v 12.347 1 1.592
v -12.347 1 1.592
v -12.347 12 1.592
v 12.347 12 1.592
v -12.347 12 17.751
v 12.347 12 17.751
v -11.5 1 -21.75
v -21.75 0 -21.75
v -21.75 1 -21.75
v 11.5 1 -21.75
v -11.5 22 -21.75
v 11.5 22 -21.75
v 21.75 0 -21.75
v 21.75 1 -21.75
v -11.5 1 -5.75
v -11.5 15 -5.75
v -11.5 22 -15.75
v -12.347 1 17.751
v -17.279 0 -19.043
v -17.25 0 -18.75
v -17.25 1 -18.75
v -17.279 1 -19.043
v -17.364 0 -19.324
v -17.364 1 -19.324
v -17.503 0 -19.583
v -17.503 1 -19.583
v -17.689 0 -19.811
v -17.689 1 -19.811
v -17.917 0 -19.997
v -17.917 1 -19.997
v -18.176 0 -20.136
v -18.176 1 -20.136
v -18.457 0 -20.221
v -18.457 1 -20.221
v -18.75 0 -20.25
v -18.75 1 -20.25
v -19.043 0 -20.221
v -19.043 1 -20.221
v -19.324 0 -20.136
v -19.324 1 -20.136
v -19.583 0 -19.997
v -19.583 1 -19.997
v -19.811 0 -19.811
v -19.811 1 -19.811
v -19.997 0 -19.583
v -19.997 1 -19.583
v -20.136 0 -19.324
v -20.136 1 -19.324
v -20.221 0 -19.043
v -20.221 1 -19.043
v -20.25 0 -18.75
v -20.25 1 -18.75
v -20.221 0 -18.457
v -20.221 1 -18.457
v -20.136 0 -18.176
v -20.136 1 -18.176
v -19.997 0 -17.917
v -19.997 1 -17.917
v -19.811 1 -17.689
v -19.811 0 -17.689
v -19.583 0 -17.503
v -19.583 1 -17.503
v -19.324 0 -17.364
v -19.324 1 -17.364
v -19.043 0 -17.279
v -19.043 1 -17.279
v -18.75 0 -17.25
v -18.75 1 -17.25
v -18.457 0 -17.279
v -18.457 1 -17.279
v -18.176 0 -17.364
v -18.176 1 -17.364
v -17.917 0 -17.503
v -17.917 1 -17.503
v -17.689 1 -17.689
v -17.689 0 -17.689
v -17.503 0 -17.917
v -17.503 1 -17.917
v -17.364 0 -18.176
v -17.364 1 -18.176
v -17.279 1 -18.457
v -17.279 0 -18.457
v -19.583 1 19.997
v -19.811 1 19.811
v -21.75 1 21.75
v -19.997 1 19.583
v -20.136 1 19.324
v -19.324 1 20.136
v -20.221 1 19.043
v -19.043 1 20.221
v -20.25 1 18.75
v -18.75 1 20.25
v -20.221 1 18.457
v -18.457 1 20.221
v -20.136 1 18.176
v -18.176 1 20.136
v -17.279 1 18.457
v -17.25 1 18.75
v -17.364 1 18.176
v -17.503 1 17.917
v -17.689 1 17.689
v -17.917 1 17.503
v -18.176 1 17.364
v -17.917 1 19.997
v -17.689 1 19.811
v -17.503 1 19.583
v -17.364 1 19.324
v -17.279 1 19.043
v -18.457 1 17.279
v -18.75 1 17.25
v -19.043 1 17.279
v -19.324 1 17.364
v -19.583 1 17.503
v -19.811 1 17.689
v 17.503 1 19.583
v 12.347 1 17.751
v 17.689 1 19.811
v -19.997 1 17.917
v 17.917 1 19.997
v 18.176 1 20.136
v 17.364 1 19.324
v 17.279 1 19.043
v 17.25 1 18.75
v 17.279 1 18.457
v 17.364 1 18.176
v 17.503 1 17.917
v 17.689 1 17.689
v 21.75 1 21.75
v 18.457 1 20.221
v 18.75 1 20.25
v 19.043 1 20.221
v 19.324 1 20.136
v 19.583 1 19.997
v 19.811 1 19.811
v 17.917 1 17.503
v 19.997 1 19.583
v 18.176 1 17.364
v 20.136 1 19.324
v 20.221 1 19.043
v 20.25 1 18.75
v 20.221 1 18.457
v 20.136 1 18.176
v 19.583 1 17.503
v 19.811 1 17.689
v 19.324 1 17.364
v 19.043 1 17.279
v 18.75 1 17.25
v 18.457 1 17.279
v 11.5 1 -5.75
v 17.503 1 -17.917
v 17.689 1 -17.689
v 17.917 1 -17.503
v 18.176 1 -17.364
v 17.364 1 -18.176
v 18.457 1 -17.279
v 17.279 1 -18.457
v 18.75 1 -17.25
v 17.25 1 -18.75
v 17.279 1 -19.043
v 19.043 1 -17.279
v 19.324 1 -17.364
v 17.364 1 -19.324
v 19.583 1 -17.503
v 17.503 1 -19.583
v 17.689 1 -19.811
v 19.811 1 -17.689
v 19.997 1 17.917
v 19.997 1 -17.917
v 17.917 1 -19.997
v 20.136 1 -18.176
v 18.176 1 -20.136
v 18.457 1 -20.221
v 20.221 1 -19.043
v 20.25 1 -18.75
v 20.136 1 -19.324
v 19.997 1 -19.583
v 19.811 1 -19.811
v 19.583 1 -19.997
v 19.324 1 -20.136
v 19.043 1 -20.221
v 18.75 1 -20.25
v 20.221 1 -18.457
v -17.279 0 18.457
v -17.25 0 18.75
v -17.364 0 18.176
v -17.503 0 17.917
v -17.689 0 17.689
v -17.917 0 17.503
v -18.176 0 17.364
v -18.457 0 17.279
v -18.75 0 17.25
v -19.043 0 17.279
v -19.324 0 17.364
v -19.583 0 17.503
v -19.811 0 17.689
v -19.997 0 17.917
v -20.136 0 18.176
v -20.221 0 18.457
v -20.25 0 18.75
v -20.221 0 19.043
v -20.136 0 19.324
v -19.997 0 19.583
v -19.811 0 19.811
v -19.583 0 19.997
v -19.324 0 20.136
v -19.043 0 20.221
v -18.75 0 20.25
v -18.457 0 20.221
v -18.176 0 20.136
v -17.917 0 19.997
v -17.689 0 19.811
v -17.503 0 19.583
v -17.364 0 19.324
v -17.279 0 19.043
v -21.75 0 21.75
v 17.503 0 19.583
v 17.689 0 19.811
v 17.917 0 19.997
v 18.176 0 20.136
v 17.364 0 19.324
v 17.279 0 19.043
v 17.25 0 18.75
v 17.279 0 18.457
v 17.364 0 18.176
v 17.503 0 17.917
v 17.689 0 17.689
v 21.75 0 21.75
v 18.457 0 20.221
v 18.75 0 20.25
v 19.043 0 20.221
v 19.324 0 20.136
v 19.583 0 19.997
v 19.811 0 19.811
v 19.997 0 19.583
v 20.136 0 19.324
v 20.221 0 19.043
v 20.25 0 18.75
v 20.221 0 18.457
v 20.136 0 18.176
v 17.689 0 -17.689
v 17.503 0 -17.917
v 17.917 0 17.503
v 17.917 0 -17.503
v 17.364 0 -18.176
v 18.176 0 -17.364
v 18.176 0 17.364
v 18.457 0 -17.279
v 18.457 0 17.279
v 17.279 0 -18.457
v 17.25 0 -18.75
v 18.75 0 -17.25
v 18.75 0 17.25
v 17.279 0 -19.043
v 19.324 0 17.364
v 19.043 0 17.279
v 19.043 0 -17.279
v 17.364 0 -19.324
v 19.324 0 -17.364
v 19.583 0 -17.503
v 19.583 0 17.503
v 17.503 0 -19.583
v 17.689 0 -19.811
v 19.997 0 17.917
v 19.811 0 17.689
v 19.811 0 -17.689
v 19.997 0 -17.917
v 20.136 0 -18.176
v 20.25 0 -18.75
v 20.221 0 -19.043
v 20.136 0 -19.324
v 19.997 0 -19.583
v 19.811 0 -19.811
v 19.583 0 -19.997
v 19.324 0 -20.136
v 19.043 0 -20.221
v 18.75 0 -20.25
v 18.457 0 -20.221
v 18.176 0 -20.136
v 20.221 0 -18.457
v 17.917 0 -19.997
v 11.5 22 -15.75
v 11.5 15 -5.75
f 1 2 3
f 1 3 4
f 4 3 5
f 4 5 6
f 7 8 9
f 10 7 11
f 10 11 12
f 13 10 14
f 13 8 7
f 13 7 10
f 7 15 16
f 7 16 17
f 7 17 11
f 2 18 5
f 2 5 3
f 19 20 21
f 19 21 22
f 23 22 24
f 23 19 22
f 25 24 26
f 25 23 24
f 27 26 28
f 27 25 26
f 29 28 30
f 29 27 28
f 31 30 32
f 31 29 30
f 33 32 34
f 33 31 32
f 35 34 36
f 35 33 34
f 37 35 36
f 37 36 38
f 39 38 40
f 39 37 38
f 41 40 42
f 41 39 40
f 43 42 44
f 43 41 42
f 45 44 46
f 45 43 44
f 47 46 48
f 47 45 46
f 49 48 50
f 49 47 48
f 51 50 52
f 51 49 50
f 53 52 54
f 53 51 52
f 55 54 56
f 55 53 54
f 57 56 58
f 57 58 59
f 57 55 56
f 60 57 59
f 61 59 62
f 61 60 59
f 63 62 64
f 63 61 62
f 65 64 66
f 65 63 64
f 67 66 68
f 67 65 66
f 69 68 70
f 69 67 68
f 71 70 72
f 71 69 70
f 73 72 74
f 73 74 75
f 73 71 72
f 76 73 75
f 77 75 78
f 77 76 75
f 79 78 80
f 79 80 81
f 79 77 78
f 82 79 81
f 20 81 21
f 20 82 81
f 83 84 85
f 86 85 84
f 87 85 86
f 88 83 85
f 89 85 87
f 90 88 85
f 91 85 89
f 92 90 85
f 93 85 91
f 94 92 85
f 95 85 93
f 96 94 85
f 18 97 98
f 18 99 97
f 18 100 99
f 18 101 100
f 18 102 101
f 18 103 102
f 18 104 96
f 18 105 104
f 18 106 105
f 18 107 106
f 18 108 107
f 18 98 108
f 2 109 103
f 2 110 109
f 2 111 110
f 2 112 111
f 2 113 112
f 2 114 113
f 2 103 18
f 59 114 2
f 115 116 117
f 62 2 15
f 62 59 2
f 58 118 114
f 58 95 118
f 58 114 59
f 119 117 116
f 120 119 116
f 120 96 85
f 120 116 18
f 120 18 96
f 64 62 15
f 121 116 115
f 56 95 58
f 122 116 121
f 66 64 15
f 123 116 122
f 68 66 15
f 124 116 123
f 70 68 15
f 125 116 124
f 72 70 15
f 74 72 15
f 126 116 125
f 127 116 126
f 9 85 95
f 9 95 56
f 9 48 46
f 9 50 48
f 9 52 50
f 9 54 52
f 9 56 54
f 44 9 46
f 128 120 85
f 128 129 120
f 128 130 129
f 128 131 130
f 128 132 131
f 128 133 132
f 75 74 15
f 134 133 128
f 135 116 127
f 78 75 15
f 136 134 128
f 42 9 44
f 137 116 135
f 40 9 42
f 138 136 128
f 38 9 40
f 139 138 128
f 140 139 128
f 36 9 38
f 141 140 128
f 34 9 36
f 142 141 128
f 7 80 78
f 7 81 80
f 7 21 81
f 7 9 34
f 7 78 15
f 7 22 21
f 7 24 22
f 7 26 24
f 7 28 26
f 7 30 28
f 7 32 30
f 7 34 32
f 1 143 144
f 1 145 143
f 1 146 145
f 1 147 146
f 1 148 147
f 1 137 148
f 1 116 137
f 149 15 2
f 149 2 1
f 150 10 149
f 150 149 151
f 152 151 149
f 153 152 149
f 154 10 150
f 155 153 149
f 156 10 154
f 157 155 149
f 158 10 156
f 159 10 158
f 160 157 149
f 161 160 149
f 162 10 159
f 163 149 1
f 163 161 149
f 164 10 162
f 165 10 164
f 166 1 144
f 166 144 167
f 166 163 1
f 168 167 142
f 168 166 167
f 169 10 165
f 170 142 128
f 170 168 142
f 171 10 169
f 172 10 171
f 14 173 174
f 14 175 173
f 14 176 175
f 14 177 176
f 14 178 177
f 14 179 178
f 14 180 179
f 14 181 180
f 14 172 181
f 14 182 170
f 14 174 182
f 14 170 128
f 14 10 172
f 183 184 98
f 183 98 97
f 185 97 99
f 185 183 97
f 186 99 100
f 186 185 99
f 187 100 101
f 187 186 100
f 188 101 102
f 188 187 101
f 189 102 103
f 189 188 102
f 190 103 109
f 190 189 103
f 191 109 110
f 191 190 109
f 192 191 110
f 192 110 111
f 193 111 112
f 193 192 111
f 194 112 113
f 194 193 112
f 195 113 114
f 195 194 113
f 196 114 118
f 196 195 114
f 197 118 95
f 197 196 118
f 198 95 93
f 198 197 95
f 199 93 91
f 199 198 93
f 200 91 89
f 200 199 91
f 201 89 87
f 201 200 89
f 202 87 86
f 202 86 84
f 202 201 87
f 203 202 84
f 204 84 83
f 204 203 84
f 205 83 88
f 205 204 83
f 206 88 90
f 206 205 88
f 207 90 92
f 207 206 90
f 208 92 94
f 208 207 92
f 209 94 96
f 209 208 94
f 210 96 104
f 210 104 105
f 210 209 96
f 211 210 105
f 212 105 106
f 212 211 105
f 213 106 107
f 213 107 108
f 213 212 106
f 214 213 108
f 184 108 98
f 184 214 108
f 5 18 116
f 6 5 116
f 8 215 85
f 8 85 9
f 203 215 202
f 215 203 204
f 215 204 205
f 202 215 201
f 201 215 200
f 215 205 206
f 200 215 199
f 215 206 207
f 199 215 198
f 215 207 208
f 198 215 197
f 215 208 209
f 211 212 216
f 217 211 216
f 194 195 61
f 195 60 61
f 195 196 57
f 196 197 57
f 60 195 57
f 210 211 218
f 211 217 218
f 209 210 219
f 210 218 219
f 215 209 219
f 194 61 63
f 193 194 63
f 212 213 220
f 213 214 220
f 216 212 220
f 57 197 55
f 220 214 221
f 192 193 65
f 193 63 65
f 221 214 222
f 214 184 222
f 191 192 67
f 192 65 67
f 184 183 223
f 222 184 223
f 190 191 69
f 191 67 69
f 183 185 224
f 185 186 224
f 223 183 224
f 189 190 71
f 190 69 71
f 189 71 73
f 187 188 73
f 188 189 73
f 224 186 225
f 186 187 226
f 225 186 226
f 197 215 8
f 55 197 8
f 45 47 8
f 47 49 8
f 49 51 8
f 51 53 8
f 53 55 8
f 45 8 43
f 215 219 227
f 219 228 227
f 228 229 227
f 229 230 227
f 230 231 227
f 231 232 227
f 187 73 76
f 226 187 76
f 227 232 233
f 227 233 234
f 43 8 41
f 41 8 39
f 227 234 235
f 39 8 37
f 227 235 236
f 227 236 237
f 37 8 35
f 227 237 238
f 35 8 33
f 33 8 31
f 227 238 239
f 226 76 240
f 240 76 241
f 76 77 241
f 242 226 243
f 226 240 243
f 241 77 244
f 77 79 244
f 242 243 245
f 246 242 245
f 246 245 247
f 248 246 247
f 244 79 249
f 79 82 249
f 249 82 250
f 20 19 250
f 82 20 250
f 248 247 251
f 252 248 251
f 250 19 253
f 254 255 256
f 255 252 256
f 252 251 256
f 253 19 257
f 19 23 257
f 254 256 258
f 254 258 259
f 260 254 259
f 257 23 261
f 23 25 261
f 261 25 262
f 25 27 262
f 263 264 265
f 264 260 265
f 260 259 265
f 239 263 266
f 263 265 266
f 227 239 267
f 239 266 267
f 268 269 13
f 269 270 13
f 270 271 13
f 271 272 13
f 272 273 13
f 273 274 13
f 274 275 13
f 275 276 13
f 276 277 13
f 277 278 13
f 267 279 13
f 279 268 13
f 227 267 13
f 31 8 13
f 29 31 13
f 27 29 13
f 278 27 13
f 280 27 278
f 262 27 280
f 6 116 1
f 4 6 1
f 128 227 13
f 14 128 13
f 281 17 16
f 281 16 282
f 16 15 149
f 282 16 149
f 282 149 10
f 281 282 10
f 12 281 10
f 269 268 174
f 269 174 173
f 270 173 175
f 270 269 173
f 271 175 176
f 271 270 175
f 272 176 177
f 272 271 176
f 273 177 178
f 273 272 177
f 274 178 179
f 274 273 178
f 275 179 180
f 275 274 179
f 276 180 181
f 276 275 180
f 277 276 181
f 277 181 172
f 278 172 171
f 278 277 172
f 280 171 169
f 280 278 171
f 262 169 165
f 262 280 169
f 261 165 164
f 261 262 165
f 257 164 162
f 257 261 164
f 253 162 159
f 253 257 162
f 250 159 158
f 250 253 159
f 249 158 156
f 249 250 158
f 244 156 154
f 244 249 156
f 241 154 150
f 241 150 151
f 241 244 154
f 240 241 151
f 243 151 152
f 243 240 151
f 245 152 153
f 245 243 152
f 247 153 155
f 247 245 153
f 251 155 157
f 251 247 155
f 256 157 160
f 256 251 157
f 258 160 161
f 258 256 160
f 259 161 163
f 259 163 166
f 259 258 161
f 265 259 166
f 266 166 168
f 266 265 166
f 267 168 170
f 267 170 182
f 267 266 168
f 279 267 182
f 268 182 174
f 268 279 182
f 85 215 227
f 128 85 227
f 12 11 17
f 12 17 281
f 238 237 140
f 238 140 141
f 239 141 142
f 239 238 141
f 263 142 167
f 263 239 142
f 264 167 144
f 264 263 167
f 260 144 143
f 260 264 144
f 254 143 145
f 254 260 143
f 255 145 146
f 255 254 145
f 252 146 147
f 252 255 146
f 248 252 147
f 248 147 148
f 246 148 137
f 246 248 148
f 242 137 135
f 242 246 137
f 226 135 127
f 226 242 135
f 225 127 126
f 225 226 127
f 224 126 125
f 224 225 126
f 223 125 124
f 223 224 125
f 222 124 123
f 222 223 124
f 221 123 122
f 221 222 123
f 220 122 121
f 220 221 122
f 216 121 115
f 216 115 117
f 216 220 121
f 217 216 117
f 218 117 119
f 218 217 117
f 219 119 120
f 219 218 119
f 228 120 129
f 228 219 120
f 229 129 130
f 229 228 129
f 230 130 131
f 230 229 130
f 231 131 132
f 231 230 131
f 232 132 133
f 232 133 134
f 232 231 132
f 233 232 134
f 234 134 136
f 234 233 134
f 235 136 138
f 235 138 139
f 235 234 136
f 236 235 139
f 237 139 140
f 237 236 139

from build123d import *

# Parameters (mm, degrees)
CROQUIS1_W              = 43.5
CROQUIS1_H              = 43.5
CROQUIS1_R              = 1.5
SALIENTE_EXTRUIR1_DEPTH = 1
CROQUIS2_W              = 23
CROQUIS2_H              = 16
SALIENTE_EXTRUIR2_DEPTH = 21
CROQUIS3_W              = 24.693378616
CROQUIS3_H              = 16.159035638
SALIENTE_EXTRUIR3_DEPTH = 11
CHAFL_N1_SIZE           = 7
CHAFL_N1_SIZE2          = 10


with BuildPart() as part:
    # Croquis1 → Saliente-Extruir1 (new body)
    with BuildSketch(Plane(origin=(0, 0, 0), x_dir=(1, 0, 0), z_dir=(0, 1, 0))):
        Rectangle(CROQUIS1_W, CROQUIS1_H)
        with Locations((-18.75, 18.75)):
            Circle(CROQUIS1_R, mode=Mode.SUBTRACT)
        with Locations((18.75, 18.75)):
            Circle(CROQUIS1_R, mode=Mode.SUBTRACT)
        with Locations((18.75, -18.75)):
            Circle(CROQUIS1_R, mode=Mode.SUBTRACT)
        with Locations((-18.75, -18.75)):
            Circle(CROQUIS1_R, mode=Mode.SUBTRACT)
    extrude(amount=SALIENTE_EXTRUIR1_DEPTH)

    # Croquis2 → Saliente-Extruir2 (add)
    with BuildSketch(Plane(origin=(0, 1, 0), x_dir=(1, 0, 0), z_dir=(0, 1, 0))):
        with Locations((0, 13.75)):
            Rectangle(CROQUIS2_W, CROQUIS2_H)
    extrude(amount=SALIENTE_EXTRUIR2_DEPTH)

    # Croquis3 → Saliente-Extruir3 (add)
    with BuildSketch(Plane(origin=(0, 1, 0), x_dir=(1, 0, 0), z_dir=(0, 1, 0))):
        with Locations((0, -9.671859961)):
            Rectangle(CROQUIS3_W, CROQUIS3_H)
    extrude(amount=SALIENTE_EXTRUIR3_DEPTH)

    # Chaflán1
    chafl_n1_edges = [part.edges().sort_by_distance(p)[0] for p in [
        (0, 22, -5.75),
    ]]
    chafl_n1_side = [part.faces().sort_by_distance(p)[0] for p in [
        (0, 11.5, -5.75),
    ]]
    chamfer(chafl_n1_edges, length=CHAFL_N1_SIZE, length2=CHAFL_N1_SIZE2, reference=chafl_n1_side[0])


solid = part.part
